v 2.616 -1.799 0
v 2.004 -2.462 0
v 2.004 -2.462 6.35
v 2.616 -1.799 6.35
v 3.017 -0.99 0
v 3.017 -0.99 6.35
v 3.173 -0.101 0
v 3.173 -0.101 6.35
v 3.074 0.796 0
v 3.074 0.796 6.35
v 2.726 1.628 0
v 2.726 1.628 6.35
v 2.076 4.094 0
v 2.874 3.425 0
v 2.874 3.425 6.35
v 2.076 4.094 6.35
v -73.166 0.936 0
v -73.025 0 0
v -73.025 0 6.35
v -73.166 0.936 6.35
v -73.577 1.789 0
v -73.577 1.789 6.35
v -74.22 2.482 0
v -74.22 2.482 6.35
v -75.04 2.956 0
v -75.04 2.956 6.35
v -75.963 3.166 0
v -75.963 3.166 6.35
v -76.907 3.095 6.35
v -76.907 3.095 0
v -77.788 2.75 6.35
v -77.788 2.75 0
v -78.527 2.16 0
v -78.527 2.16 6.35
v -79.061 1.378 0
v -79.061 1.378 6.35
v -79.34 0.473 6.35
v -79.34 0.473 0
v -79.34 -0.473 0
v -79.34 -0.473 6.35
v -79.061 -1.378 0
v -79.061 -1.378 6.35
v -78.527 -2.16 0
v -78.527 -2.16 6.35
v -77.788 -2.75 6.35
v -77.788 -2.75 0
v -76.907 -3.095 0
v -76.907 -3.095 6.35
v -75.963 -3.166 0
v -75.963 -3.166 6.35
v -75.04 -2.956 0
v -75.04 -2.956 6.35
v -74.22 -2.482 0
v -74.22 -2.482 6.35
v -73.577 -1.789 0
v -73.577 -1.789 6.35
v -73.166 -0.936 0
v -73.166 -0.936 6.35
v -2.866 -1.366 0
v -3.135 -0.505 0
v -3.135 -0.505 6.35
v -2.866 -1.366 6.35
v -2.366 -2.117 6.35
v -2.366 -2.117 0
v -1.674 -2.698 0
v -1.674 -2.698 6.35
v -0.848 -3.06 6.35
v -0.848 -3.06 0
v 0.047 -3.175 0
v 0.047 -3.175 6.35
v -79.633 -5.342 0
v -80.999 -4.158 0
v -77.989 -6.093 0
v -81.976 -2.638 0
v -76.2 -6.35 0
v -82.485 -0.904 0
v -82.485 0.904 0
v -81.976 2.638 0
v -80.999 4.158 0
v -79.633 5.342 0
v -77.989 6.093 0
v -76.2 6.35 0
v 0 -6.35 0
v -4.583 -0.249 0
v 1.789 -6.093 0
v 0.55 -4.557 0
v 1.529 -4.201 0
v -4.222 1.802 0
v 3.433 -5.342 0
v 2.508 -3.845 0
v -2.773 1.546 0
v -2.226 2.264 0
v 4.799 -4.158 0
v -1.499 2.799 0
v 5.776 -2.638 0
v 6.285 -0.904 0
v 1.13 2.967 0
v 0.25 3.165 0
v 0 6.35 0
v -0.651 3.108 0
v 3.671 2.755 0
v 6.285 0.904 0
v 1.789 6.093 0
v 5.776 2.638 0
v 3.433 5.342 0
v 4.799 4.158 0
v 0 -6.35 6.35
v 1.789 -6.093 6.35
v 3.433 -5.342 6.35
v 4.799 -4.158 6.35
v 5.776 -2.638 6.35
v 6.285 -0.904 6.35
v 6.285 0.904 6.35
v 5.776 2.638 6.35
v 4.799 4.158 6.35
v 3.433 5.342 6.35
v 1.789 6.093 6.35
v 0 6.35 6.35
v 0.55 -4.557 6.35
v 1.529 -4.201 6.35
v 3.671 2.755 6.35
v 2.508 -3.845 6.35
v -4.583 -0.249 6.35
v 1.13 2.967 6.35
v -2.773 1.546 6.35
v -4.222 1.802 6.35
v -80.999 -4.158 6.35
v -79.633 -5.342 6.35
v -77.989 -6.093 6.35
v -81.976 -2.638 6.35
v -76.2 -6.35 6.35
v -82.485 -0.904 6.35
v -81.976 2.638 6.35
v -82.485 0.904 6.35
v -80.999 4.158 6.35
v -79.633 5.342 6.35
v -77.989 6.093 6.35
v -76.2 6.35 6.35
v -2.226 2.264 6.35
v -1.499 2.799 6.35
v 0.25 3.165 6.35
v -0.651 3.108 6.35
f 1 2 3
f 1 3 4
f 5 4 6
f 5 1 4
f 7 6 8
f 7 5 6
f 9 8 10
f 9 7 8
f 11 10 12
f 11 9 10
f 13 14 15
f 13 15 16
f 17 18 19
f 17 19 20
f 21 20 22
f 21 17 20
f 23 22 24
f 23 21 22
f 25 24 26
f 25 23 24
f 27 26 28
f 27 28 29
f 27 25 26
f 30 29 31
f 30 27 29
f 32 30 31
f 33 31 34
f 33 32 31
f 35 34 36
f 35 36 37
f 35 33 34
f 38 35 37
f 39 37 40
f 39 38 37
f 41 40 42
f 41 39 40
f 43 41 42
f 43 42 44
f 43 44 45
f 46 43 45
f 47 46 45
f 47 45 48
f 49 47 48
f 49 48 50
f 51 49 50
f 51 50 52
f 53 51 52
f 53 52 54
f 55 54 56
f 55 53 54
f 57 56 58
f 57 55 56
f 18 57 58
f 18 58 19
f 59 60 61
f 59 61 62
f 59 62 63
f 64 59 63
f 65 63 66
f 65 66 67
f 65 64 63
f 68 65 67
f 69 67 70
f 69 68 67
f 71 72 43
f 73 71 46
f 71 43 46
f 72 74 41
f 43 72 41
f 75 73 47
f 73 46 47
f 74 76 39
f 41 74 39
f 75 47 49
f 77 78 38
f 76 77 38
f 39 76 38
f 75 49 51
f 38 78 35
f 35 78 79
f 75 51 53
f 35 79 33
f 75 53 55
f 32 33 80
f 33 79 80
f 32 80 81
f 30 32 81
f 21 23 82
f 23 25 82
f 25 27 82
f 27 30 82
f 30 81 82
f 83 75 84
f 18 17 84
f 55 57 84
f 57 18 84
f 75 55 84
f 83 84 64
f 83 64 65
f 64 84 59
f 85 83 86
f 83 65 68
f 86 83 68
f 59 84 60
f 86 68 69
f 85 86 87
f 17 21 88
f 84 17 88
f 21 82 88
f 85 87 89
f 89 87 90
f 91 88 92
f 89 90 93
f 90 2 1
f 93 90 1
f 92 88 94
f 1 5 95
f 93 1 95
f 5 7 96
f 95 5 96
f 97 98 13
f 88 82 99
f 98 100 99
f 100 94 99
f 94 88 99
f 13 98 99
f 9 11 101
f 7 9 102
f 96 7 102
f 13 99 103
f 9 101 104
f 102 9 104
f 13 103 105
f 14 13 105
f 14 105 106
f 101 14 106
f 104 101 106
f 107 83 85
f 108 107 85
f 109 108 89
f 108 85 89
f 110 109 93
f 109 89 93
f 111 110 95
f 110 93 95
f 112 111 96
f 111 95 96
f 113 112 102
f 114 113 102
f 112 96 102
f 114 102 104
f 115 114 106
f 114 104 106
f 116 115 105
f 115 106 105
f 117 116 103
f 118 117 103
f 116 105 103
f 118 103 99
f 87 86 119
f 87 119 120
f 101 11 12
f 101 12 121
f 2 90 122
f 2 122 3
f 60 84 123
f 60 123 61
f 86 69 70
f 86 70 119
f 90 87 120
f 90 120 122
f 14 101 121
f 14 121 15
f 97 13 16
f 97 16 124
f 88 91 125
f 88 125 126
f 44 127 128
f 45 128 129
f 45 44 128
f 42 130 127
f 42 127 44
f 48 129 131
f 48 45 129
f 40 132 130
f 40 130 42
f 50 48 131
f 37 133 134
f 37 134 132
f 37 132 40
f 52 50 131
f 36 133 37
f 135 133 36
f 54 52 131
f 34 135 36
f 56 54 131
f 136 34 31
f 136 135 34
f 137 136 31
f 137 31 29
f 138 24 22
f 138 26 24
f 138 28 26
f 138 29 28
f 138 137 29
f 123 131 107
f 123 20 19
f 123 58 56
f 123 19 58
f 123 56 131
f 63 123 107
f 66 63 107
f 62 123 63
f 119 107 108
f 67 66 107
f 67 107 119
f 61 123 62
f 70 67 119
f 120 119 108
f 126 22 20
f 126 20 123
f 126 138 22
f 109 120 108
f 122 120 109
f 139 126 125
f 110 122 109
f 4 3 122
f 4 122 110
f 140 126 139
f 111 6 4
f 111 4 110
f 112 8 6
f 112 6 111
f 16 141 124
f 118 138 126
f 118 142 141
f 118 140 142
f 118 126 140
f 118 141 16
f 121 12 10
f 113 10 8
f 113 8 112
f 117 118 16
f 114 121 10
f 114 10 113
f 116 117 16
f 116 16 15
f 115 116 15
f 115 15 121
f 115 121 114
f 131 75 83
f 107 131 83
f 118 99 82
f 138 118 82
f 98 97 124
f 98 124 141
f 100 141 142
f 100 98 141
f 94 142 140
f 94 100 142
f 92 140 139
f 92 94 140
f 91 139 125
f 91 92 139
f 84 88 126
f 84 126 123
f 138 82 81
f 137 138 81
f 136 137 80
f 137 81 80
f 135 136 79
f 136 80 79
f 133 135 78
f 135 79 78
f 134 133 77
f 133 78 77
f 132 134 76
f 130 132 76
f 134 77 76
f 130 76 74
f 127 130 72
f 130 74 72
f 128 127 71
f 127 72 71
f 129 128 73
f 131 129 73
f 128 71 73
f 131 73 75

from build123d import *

# Parameters (mm, degrees)
SKETCH1_R        = 3.175
EXTRUSION1_DEPTH = 6.35


with BuildPart() as part:
    # Sketch1 → Extrusion1 (new body)
    with BuildSketch(Plane.XY):
        with BuildLine():
            Line((-76.2, -6.35), (0, -6.35))
            ThreePointArc((0, -6.35), (6.35, 0), (0, 6.35))
            Line((0, 6.35), (-76.2, 6.35))
            ThreePointArc((-76.2, 6.35), (-82.55, 0), (-76.2, -6.35))
        make_face()
        with Locations((-76.2, 0)):
            Circle(SKETCH1_R, mode=Mode.SUBTRACT)
        with BuildLine():
            ThreePointArc((2.004434618, -2.462288948), (3.126764616, -0.551332964), (2.725704838, 1.62823774))
            Line((2.725704838, 1.62823774), (3.671276413, 2.755126062))
            Line((3.671276413, 2.755126062), (2.87351773, 3.424525079))
            Line((2.87351773, 3.424525079), (2.075759047, 4.093924095))
            Line((2.075759047, 4.093924095), (1.130187472, 2.967035773))
            ThreePointArc((1.130187472, 2.967035773), (-1.085913955, 2.983524071), (-2.772947665, 1.546410763))
            Line((-2.772947665, 1.546410763), (-4.221647367, 1.801855607))
            Line((-4.221647367, 1.801855607), (-4.402484579, 0.776276813))
            Line((-4.402484579, 0.776276813), (-4.583321791, -0.249301981))
            Line((-4.583321791, -0.249301981), (-3.134622089, -0.504746825))
            ThreePointArc((-3.134622089, -0.504746825), (-2.040850661, -2.432191107), (0.047242827, -3.174648503))
            Line((0.047242827, -3.174648503), (0.550370953, -4.556981669))
            Line((0.550370953, -4.556981669), (1.528966849, -4.200801892))
            Line((1.528966849, -4.200801892), (2.507562744, -3.844622115))
            Line((2.507562744, -3.844622115), (2.004434618, -2.462288948))
        make_face(mode=Mode.SUBTRACT)
    extrude(amount=EXTRUSION1_DEPTH)


solid = part.part
